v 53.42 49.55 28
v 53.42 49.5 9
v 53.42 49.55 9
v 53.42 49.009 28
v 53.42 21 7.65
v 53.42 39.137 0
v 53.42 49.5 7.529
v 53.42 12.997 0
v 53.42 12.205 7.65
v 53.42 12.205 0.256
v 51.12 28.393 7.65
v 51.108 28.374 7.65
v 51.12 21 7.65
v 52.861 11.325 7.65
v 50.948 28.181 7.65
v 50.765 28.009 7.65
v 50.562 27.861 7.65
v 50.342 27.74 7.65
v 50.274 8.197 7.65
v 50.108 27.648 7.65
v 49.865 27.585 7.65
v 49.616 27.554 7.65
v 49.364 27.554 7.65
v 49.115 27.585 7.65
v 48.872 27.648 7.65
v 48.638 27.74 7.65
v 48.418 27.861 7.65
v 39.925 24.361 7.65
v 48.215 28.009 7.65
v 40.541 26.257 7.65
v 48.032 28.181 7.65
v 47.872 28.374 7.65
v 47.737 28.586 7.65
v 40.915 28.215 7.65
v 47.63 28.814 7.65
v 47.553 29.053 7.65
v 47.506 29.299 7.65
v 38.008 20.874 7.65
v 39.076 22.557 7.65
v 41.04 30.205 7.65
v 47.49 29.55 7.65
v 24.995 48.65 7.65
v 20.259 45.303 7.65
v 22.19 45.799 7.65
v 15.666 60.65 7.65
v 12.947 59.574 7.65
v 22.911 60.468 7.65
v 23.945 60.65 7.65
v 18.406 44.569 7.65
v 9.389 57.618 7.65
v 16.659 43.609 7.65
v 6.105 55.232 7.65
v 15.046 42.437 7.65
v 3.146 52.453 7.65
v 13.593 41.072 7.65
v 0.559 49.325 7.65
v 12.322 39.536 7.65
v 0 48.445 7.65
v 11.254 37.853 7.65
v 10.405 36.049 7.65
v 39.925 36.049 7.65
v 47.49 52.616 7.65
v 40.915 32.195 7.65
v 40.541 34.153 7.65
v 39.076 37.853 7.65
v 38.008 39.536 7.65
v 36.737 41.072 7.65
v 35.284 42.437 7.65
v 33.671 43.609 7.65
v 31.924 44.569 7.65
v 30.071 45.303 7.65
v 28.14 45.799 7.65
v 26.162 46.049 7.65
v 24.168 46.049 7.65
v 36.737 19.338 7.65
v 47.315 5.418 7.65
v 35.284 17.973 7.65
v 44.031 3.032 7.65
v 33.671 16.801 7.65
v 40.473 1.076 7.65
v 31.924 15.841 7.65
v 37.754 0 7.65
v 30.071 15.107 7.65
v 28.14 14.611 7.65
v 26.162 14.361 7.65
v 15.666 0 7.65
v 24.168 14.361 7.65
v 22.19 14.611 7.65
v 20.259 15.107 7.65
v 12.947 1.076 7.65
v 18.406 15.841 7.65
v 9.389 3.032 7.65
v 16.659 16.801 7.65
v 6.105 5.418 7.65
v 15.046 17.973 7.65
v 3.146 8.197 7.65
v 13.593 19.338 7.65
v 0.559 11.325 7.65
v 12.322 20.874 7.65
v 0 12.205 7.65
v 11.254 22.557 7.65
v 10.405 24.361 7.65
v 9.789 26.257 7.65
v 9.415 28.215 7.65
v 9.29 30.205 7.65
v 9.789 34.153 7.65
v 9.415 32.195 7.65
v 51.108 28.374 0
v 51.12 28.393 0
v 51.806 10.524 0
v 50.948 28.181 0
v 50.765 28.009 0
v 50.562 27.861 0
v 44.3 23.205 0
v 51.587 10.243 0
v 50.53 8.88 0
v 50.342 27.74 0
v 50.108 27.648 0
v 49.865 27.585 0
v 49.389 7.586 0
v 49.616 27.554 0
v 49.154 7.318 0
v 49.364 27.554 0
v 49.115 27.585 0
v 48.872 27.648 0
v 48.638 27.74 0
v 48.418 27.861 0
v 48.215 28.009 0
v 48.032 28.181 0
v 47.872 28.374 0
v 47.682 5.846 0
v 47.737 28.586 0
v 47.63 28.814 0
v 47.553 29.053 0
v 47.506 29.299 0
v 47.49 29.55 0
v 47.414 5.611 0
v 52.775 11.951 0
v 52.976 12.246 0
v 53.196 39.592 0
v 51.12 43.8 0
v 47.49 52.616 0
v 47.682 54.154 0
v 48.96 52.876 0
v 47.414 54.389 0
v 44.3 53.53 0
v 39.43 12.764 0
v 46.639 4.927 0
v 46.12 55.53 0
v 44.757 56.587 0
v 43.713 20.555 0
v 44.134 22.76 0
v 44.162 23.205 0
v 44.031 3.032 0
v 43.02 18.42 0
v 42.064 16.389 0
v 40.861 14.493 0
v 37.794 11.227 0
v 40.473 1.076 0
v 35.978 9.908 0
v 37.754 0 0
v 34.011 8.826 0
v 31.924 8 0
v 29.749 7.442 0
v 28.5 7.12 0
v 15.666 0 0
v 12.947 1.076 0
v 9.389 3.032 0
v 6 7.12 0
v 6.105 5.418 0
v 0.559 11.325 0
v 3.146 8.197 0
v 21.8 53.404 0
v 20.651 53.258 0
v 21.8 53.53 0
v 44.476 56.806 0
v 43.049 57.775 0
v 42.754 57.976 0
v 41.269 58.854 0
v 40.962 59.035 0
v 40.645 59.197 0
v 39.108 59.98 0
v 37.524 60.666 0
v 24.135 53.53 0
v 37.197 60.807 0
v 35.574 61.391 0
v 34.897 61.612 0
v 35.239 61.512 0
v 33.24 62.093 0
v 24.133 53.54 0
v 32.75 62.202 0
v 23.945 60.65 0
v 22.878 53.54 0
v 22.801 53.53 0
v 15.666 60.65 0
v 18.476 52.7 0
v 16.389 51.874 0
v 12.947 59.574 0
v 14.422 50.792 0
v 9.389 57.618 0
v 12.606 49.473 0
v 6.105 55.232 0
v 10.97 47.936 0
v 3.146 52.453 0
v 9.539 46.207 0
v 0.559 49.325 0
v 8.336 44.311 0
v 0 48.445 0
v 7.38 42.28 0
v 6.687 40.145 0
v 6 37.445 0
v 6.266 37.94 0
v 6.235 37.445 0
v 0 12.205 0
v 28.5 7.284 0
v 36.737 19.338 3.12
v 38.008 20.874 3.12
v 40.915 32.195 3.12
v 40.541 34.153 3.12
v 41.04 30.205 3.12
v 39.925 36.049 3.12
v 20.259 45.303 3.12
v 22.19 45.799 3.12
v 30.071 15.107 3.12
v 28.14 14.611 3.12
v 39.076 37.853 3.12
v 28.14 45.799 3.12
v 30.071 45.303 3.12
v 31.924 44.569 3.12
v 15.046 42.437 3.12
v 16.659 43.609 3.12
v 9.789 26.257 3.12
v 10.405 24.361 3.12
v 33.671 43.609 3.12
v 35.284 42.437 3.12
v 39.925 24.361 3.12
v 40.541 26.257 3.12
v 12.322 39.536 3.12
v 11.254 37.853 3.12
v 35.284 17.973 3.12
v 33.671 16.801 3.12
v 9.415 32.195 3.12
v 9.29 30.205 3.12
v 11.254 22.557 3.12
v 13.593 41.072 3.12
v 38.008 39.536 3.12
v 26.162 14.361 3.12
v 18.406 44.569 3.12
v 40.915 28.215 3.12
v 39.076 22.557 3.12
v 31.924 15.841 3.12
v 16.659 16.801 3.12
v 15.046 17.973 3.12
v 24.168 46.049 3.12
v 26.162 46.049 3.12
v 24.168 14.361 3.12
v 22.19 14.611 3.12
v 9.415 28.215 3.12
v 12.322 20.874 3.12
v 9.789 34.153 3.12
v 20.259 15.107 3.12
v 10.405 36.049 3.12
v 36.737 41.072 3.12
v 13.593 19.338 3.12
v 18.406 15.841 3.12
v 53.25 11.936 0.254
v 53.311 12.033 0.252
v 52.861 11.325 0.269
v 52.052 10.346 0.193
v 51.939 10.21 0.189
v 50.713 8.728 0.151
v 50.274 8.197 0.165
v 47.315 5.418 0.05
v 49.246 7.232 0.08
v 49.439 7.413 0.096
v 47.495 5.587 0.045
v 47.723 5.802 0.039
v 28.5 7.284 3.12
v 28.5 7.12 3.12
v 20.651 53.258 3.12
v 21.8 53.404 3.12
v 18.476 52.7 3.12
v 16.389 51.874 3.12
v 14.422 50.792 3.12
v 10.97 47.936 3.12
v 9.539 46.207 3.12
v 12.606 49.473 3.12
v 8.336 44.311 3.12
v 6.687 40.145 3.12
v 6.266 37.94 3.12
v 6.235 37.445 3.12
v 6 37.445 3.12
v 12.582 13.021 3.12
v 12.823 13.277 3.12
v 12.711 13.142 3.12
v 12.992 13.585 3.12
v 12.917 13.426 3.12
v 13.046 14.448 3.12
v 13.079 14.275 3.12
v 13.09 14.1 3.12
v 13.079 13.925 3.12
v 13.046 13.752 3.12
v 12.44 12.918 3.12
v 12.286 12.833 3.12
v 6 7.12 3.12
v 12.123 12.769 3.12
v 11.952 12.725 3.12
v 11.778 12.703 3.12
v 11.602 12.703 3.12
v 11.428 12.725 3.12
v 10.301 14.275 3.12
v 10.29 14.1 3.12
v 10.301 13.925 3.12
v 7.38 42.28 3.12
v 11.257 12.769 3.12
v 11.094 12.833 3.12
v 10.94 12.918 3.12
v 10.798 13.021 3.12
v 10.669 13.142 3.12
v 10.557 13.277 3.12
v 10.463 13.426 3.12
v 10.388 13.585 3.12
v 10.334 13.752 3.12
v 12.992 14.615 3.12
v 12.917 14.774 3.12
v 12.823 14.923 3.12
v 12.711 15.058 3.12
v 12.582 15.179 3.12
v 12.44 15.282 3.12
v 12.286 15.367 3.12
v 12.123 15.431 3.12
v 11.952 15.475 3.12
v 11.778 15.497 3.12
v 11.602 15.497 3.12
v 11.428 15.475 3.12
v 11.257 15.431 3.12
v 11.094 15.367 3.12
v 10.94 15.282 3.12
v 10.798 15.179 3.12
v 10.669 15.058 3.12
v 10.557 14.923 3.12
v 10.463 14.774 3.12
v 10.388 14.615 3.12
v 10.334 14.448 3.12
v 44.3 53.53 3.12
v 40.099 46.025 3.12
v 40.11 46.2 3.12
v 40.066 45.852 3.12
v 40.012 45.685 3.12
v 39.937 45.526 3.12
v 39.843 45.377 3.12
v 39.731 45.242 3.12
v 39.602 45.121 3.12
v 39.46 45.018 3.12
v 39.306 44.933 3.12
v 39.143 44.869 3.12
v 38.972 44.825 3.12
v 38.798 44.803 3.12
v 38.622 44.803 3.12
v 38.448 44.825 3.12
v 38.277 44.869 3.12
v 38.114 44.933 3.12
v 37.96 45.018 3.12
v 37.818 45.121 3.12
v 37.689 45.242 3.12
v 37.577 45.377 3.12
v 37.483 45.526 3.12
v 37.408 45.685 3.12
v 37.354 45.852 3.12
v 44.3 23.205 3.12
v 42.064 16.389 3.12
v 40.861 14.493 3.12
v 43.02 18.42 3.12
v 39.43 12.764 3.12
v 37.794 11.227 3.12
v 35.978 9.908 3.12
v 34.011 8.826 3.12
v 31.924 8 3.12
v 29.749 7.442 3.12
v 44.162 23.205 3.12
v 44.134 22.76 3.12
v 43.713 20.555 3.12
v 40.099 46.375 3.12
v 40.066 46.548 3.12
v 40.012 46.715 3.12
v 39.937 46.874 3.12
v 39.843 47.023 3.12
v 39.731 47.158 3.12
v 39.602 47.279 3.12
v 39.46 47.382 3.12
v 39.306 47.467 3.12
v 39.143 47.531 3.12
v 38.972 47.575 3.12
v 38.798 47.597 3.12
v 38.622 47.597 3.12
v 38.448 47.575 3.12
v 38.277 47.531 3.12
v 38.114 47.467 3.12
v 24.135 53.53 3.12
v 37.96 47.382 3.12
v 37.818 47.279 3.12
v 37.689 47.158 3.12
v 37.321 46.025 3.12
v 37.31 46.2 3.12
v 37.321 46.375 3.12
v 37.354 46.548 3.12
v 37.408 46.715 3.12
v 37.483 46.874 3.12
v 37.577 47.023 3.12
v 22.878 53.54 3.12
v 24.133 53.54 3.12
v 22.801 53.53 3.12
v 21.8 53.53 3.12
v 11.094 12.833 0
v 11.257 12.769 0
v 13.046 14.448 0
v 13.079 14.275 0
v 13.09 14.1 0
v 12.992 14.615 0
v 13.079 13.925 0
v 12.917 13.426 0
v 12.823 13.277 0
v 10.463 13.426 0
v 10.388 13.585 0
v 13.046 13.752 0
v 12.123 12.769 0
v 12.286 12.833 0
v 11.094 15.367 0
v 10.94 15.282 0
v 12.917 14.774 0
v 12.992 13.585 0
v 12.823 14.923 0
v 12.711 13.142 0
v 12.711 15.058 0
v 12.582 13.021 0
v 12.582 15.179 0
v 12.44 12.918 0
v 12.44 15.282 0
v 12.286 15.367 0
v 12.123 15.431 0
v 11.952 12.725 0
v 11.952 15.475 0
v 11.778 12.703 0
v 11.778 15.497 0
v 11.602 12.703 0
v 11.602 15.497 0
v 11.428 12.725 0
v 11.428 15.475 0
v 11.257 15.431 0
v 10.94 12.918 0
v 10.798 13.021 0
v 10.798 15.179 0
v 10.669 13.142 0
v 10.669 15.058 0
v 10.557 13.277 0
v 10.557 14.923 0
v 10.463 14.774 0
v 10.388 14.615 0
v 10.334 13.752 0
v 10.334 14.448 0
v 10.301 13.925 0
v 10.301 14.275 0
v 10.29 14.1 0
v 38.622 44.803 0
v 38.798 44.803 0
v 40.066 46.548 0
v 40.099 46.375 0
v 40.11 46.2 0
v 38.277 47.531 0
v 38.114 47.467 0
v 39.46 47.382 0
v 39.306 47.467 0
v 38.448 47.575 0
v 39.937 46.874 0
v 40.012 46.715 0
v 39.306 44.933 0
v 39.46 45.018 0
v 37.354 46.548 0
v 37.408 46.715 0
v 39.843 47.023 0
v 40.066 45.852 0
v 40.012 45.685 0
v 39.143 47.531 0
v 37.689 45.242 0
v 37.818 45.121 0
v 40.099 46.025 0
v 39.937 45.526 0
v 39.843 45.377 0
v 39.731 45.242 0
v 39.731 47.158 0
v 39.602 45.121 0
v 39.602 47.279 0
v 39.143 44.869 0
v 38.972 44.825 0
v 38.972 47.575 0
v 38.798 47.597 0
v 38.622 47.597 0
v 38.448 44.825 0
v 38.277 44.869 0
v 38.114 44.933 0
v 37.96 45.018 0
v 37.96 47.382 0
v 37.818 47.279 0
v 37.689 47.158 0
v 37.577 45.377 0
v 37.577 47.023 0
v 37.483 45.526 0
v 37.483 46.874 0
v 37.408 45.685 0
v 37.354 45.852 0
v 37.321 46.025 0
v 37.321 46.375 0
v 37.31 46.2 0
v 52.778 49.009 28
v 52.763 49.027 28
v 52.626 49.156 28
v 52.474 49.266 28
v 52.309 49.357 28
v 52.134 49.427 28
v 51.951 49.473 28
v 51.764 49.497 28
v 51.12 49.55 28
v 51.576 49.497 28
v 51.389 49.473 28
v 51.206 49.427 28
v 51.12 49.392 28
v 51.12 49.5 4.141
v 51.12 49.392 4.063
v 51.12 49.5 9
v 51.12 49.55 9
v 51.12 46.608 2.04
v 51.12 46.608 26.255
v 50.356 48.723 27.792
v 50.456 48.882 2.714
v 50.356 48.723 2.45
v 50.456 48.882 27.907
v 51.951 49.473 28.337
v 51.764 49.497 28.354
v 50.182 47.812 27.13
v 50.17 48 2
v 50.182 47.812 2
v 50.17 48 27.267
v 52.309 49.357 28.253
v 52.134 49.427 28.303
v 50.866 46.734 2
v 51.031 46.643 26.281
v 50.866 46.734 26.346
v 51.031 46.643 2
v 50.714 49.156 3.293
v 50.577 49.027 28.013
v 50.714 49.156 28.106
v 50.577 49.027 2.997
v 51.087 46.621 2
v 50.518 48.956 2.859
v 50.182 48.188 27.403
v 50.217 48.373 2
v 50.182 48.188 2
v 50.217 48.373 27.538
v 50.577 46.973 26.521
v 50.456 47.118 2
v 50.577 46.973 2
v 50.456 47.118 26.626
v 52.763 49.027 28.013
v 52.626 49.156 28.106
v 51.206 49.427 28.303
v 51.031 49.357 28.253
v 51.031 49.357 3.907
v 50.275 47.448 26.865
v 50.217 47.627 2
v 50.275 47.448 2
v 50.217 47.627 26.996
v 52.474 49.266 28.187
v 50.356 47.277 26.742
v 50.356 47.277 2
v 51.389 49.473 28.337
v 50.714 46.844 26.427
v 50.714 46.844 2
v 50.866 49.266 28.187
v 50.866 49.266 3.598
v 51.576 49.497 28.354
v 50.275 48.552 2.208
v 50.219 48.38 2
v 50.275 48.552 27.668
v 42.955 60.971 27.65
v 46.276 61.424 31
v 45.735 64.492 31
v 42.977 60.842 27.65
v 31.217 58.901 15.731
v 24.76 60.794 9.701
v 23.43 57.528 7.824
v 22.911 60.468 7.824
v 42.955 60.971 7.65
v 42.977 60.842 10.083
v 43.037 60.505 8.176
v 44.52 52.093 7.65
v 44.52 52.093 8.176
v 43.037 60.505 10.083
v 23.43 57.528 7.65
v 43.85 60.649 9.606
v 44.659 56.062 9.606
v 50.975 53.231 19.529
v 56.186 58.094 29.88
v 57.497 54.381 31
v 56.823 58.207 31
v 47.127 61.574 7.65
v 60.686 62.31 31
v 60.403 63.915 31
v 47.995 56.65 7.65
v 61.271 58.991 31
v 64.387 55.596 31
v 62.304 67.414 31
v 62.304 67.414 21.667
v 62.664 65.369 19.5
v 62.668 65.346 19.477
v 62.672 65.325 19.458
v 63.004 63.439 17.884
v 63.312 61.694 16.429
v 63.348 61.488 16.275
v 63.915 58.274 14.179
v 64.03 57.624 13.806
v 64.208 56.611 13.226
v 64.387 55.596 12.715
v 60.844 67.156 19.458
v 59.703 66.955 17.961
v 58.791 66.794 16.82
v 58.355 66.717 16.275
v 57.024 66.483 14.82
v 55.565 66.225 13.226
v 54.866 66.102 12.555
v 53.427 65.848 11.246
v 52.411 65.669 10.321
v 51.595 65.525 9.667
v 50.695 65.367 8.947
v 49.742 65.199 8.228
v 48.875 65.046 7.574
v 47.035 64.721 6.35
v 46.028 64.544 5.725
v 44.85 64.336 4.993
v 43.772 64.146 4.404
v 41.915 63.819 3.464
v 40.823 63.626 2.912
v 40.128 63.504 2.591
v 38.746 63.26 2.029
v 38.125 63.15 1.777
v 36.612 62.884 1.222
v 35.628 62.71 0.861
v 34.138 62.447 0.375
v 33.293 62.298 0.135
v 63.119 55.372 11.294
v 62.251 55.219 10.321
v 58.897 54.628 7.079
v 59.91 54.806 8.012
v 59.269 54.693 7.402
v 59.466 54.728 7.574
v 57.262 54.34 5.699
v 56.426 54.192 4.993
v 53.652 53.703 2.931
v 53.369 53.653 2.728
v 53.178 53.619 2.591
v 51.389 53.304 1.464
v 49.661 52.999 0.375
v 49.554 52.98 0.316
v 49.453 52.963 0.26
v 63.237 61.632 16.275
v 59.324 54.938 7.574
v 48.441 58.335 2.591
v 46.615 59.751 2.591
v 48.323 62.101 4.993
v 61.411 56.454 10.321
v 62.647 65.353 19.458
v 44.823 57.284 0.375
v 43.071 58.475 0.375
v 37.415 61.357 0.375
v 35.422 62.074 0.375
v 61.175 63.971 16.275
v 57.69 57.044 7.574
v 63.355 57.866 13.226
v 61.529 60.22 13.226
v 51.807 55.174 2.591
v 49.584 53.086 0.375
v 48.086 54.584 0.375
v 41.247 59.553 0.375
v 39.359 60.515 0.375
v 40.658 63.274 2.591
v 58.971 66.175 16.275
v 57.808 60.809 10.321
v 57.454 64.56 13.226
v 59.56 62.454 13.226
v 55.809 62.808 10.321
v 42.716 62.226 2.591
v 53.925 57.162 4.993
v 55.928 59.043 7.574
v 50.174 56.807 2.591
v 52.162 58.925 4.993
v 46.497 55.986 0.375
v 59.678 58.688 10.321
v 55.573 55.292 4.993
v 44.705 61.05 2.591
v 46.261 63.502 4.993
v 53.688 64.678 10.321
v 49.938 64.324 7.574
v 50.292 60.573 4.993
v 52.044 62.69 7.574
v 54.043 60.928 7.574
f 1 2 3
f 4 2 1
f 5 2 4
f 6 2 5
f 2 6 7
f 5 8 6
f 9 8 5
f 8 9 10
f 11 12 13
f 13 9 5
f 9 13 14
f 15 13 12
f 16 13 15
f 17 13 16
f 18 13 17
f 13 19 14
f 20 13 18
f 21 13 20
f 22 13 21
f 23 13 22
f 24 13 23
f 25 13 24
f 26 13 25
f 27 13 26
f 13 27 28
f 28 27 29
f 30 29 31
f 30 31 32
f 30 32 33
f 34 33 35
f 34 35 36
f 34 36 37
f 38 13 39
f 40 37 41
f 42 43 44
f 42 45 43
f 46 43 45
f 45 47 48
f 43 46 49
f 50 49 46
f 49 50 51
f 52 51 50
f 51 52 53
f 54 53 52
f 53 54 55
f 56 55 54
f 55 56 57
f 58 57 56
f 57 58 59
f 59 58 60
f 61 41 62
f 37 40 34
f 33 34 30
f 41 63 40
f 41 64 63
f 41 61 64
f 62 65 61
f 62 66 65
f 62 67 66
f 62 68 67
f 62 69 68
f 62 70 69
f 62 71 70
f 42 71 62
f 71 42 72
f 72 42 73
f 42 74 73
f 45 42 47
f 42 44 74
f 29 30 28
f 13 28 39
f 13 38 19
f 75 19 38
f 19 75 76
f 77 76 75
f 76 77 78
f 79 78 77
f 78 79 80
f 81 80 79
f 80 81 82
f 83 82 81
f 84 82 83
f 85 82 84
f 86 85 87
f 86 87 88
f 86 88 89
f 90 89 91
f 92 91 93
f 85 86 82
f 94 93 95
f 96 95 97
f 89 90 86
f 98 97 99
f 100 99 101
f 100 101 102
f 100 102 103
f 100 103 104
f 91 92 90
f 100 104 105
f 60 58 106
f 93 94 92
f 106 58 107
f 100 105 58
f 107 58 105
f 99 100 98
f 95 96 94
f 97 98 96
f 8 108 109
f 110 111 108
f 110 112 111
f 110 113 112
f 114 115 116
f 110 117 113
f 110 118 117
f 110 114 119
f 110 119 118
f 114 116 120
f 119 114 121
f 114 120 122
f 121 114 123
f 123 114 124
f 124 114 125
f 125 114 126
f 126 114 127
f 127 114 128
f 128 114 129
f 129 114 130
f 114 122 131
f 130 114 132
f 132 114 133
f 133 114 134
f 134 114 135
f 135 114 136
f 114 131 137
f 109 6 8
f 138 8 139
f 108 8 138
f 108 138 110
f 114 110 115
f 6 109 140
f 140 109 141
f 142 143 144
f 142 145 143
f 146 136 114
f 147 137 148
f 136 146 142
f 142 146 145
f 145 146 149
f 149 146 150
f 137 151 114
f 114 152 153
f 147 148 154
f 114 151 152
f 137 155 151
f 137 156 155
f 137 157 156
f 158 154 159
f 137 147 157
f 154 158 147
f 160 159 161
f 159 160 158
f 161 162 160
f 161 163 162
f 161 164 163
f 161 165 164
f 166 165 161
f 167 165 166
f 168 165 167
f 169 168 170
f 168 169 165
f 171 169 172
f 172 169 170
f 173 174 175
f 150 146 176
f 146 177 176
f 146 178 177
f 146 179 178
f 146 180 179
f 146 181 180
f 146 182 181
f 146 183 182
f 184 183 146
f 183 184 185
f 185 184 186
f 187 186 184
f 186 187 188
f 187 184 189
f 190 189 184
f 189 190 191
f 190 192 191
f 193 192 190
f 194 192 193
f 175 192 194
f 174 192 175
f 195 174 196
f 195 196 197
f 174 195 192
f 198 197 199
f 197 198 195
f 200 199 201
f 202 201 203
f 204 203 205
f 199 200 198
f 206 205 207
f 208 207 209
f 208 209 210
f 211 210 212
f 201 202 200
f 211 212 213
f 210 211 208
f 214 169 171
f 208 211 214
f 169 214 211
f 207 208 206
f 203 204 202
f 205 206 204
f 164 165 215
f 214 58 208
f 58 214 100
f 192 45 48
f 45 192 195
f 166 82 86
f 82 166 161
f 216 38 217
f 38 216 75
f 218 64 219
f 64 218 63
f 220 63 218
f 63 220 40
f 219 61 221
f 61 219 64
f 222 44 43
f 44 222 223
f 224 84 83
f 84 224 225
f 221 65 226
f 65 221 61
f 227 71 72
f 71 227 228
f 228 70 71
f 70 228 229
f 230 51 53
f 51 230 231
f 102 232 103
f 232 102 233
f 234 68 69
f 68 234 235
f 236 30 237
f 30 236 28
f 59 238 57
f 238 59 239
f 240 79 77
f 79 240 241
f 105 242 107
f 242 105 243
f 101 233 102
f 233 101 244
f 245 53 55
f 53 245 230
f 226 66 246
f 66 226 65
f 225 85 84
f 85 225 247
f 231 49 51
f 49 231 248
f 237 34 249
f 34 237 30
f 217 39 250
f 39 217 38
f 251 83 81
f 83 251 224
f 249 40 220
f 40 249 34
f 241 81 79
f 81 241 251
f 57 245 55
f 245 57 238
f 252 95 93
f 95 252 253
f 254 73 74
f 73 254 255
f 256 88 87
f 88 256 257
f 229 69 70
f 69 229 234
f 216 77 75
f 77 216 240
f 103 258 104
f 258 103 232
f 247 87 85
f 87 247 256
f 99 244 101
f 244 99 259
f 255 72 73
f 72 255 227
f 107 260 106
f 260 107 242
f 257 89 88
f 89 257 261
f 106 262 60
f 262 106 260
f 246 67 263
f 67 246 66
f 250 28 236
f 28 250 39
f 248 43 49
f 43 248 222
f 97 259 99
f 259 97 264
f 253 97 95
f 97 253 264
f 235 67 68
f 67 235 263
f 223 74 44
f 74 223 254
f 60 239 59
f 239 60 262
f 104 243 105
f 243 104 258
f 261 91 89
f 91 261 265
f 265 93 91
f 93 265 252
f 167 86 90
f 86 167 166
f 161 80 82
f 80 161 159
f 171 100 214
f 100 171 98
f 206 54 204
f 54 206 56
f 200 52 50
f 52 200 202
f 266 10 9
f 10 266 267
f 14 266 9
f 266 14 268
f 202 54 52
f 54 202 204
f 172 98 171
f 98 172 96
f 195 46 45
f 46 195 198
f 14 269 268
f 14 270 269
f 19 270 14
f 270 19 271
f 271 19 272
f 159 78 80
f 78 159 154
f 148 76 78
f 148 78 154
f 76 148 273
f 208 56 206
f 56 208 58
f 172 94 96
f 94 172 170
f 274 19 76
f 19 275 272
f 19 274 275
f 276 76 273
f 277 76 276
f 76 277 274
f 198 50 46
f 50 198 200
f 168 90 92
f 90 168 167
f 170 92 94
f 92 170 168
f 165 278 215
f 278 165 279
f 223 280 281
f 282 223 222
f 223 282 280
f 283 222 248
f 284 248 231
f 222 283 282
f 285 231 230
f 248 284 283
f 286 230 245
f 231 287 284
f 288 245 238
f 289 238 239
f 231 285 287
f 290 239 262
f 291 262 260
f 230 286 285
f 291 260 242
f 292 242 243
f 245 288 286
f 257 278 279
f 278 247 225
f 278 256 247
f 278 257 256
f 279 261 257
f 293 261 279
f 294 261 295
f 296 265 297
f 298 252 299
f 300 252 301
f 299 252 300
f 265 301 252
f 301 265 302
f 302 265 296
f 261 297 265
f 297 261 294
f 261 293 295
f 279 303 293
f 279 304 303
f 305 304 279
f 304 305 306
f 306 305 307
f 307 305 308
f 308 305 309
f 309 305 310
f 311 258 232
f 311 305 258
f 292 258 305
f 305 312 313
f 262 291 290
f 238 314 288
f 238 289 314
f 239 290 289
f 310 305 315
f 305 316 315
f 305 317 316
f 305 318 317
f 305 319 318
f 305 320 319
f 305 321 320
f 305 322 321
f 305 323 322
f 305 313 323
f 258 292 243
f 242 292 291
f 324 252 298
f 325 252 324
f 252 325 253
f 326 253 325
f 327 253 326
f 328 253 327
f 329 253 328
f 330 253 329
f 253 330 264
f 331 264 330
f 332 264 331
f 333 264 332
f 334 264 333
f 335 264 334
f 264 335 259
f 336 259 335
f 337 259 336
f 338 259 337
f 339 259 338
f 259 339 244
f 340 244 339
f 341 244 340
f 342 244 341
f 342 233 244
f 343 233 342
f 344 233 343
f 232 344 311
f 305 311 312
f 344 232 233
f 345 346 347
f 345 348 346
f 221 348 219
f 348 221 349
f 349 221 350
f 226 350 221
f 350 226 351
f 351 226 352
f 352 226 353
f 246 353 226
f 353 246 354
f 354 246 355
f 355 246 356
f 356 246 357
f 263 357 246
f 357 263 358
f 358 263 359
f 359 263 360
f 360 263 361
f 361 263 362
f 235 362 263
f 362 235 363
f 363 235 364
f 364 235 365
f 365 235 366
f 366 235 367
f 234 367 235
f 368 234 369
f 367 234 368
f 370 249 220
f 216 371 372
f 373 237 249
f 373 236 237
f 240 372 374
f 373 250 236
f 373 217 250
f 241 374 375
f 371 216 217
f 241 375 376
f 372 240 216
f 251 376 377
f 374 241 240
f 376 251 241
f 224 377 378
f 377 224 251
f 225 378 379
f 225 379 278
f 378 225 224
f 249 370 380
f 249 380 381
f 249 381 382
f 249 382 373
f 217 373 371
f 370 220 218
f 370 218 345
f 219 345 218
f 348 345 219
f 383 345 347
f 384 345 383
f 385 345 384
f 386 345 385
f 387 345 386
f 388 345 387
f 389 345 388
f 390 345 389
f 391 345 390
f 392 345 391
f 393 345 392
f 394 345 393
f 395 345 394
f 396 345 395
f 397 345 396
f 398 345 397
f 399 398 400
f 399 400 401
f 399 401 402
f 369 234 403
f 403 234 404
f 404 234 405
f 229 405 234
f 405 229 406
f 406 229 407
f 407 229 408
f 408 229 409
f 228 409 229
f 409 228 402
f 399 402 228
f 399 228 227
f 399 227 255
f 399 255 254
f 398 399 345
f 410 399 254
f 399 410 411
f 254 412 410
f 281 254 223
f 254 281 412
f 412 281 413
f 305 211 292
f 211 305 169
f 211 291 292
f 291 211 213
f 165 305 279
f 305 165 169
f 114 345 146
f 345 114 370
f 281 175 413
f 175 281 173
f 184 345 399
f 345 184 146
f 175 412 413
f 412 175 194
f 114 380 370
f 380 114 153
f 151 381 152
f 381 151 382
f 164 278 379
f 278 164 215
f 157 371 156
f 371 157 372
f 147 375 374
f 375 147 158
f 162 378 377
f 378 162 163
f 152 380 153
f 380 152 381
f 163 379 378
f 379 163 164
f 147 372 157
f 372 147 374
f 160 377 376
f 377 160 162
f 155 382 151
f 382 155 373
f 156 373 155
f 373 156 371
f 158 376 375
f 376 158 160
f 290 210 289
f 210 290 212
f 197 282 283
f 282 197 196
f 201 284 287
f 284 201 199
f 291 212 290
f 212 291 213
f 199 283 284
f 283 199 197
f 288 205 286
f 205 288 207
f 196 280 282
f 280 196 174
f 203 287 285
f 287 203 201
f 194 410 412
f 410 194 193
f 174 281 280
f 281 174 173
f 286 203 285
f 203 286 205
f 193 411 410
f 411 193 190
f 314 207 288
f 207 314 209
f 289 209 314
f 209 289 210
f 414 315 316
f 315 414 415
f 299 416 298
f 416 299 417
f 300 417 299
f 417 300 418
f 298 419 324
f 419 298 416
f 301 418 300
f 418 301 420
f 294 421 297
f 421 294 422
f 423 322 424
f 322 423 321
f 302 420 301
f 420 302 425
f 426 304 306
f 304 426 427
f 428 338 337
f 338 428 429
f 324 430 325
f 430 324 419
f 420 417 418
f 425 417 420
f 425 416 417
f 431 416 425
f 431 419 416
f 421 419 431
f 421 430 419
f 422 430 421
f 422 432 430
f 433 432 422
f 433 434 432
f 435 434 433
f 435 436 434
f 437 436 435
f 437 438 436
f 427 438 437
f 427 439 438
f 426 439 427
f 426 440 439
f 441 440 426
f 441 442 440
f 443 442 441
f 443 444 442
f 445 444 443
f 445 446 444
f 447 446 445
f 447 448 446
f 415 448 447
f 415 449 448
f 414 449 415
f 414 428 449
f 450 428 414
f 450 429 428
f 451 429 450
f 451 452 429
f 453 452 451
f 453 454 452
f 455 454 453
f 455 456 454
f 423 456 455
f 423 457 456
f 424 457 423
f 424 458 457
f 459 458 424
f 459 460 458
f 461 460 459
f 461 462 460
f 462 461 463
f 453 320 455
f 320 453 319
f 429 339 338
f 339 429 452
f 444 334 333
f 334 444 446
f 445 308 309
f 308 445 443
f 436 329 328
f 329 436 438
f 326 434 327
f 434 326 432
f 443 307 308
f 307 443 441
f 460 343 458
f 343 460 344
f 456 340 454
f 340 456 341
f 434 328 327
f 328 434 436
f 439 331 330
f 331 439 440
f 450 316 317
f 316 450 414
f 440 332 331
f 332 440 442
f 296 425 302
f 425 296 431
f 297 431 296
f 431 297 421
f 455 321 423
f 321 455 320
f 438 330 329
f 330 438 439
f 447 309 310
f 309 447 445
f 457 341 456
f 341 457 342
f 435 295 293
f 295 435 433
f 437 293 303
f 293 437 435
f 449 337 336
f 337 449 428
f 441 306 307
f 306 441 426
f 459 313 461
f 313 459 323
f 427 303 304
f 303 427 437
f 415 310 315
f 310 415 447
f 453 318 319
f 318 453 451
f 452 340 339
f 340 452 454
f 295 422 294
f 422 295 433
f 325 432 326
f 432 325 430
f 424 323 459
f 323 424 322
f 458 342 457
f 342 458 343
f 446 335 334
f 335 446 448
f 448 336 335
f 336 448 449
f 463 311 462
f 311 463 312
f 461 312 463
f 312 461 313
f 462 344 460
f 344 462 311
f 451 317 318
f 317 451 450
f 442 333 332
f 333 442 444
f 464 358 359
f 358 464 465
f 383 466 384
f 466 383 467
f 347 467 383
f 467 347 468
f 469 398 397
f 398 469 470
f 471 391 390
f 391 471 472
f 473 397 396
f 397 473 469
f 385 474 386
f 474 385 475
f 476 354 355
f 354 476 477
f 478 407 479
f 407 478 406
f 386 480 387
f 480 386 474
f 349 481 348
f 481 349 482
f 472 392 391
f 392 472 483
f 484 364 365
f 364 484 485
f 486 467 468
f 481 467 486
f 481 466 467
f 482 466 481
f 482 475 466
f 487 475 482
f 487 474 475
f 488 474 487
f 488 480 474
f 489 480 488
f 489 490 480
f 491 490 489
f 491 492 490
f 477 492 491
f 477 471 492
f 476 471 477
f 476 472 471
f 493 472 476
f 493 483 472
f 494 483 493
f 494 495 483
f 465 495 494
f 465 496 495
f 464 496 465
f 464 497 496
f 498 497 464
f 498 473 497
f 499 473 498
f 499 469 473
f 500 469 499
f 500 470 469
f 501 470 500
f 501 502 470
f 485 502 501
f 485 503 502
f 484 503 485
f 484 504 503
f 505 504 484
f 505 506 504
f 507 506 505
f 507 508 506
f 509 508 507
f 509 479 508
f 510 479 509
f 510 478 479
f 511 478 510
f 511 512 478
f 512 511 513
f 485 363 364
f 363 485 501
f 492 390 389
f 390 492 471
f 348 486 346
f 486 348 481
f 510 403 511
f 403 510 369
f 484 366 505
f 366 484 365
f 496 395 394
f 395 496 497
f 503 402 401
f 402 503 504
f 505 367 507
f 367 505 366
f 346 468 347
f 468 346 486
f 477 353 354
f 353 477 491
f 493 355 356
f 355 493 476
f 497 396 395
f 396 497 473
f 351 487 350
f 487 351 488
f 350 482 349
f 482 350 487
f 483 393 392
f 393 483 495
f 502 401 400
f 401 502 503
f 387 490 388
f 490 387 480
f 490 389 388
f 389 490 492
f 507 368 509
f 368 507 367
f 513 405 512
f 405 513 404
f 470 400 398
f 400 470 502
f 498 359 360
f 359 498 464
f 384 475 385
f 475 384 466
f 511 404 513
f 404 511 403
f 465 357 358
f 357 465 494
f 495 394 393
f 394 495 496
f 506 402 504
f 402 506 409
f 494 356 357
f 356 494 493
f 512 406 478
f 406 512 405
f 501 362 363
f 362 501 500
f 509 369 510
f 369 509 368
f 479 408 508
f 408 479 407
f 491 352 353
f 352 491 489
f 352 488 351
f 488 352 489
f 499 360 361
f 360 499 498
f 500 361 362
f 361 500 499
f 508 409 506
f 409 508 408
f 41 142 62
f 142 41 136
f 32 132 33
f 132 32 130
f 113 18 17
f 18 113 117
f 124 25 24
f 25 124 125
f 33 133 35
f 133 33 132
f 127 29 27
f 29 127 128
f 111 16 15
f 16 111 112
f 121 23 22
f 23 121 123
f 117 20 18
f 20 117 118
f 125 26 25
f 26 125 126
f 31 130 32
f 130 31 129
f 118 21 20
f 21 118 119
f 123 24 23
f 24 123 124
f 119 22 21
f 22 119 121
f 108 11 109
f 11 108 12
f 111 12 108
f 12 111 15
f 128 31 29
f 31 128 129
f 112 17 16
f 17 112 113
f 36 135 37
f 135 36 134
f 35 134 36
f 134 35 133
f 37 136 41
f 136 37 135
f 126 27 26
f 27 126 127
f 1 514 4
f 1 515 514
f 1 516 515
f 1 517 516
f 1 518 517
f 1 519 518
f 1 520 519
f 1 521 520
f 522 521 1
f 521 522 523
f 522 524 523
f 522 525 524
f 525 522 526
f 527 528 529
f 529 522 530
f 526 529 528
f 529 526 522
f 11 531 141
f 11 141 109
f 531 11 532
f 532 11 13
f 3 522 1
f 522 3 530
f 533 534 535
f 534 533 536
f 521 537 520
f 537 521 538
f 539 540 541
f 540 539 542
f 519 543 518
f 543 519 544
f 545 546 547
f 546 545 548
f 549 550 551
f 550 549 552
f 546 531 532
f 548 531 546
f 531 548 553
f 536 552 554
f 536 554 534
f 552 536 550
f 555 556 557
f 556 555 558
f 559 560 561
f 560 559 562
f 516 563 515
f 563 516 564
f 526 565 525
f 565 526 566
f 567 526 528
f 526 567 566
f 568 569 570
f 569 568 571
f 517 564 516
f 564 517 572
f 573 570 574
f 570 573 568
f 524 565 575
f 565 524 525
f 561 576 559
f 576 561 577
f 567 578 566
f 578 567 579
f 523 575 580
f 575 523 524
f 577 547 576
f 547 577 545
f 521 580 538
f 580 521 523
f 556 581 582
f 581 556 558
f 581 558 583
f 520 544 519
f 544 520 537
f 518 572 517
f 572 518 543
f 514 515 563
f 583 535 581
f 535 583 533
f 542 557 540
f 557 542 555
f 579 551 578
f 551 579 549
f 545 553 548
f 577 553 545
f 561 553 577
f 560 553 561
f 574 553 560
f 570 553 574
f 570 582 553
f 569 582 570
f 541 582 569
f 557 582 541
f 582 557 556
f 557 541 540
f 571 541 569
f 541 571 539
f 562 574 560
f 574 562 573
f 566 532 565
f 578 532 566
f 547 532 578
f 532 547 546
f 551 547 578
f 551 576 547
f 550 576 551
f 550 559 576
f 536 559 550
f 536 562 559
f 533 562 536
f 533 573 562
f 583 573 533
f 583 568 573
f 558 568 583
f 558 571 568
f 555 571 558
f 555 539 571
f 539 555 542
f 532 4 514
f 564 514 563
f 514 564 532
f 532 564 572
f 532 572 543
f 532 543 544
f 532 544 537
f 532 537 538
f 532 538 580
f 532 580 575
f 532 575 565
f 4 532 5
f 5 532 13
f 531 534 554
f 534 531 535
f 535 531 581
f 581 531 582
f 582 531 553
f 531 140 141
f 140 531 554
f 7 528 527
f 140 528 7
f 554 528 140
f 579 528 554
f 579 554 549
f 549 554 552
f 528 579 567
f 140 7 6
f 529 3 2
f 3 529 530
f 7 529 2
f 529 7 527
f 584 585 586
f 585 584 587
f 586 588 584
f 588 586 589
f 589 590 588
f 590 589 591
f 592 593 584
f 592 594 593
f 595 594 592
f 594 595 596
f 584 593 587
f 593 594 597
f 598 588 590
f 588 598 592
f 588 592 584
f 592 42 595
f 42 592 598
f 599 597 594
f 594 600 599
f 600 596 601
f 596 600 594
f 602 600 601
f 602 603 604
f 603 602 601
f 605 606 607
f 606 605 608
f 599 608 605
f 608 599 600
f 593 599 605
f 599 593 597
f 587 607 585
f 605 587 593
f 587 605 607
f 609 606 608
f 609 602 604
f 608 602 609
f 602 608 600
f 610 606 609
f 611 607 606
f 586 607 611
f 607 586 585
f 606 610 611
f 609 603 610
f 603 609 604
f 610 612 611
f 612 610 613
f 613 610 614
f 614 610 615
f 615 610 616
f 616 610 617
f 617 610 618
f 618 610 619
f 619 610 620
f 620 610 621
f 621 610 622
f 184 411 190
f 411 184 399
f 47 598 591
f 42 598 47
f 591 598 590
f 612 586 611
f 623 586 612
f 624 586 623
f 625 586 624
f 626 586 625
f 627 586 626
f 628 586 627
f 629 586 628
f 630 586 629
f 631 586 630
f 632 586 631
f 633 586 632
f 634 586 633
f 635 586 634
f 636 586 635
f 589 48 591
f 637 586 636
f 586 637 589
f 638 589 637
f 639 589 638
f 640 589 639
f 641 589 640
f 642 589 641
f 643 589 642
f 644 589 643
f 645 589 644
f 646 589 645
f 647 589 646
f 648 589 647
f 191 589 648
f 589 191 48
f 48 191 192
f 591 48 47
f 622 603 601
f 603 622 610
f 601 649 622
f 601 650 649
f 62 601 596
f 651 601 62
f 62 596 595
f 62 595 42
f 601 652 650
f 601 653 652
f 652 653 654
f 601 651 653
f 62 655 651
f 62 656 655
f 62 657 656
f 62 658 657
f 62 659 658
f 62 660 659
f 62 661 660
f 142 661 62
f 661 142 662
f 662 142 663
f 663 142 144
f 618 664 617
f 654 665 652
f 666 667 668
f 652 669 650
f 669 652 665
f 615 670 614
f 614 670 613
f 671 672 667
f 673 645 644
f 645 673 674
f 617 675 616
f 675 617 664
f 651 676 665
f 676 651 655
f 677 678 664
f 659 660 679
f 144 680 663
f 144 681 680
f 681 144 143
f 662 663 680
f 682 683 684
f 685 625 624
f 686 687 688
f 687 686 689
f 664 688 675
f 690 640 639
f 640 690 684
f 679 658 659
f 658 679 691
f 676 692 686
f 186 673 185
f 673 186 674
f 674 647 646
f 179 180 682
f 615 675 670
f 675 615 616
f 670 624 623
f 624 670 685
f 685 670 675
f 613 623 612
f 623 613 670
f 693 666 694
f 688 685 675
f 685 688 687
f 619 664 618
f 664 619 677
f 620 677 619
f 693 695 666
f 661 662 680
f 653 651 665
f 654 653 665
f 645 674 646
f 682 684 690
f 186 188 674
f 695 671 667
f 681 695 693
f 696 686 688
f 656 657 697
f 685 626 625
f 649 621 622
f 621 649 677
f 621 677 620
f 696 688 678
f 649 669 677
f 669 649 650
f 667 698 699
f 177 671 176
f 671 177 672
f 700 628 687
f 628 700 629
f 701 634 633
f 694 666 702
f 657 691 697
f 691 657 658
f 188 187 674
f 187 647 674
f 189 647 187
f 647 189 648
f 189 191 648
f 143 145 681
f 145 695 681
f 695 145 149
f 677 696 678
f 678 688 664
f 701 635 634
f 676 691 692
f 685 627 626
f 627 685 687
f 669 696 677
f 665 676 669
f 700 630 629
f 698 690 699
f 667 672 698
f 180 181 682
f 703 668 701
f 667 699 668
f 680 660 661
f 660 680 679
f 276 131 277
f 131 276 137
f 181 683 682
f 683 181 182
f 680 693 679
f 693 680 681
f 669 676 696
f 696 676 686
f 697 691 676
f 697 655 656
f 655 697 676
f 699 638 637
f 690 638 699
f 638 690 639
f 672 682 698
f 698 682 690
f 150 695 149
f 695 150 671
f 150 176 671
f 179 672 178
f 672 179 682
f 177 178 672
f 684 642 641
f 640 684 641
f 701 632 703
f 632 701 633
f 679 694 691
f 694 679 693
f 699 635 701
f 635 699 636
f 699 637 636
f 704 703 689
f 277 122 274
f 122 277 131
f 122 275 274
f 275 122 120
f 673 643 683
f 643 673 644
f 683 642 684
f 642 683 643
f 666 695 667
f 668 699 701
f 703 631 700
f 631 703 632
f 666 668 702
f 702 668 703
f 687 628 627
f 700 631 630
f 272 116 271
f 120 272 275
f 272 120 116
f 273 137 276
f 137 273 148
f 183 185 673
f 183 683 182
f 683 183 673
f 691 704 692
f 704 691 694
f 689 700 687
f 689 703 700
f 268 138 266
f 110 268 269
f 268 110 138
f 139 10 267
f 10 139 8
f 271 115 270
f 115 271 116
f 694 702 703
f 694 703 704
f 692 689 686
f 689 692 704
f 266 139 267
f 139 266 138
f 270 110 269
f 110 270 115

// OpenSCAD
// cylinder quality
cq = 50;

thickness = 7.65;
length = 53.42;
width = 60.65;
inner_diam = 31.75;
inset = 3.12;
inner_rad = inner_diam / 2;
inset_xoff = 6;
inset_yoff = 7.12;

module p1() {
 difference() {
  cube(size=[length, width, thickness]);
  translate([inner_rad + 9.29, inner_rad + 14.33, -1]) cylinder(r=inner_rad, h=thickness + 2, $fn=cq);
 }
}

module p2() {
 intersection() {
  p1();
  translate([length/2, width/2, -1]) cylinder(r=width/2 + 2, h=thickness+2, $fn=cq);
 }
}

module p3() {
 difference() {
  p2();
  translate([inset_xoff, inset_yoff, -1]) {
   //cube(size=[length - 2 * inset_xoff, width - 2 * inset_yoff, inset + 1]);
   cube(size=[22.5, width / 2, inset + 1]);
   translate([21.8 - inset_xoff, width / 2 - 2 * inset_yoff, 0])
    cube(size=[22.5, width / 2, inset + 1]);

  }
  translate([26.4,25,-1])
   cylinder(r=inner_rad + 2, h=inset + 1, $fn=cq);
  translate([24,35.7,-1])
   cylinder(r=inner_rad + 2, h=inset + 1, $fn=cq);
 }
}

module p4() {
 p3();

 translate([13.09 - 1.4, 15.5 - 1.4, 0]) cylinder(r=1.4, h=thickness, $fn=cq);
 translate([40.11 - 1.4, 47.6 - 1.4, 0]) cylinder(r=1.4, h=thickness, $fn=cq);
}

module p5() {
 difference() {
  p4();
  translate([47.49, 29.55, -1]) {
   cube(size=[14, 30, thickness + 2]);
   translate([2,0,0]) cylinder(r=2, h=thickness + 2, $fn=cq);
  }
 }

 difference() {
  p6();
  translate([length - 3.3 - 0.1, 21, thickness])
   rotate([36, 0, 0])
    cube(size=[4.5, 40, 28]);
 }

}

// Stick-outy arm on the right top
module p6() {
 translate([length - 2.3, 21, 0])
//TODO:  rotate([0,0,-5])
  cube(size=[2.3, 28.55, 28]);
 translate([length - 1.75, 48, 2])
  cylinder(r=1.5, h=28, $fn=cq);
}

module p7() {
 difference() {
  p5();
  translate([length - 5, 44, -15])
   rotate([36,0,0])
    translate([12,0,0])
     rotate([0,-50,0])
      cube(size=[9,20,15]);
  translate([length - 2.3, 49.5, -1])
   cube([10,10,10]);
 }

 difference() {
  translate([inset + inset_xoff + inner_rad,width - 12,0])
   rotate([0,0,10])
    cube(size=[40, 12, 31]);
  translate([inset_xoff, inset_yoff, -1]) {
   cube(size=[22.5, width / 2, inset + 1]);
   translate([21.8 - inset_xoff, width / 2 - 2 * inset_yoff, 0])
    cube(size=[22.5, width / 2, inset + 1]);
  }
  translate([inset + inset_xoff + inner_rad,width - 12 - 1,thickness]) {
   rotate([0,-45,10])
    cube(size=[40, 14, 31]);
 // translate([inset + inset_xoff + inner_rad,width - 12 - 1,thickness])
   rotate([0,0,10])
    cube(size=[20, 10, 31]);
   translate([20,0,0])
    rotate([0,-60,10])
     cube(size=[40, 13, 31]);
   translate([23,9,0])
    rotate([0,-60,10])
     cube(size=[40, 5, 31]);
  }
 }
}

intersection() {
 p7();
 translate([25,30,50]) sphere(r=60, $fn=100);
}
